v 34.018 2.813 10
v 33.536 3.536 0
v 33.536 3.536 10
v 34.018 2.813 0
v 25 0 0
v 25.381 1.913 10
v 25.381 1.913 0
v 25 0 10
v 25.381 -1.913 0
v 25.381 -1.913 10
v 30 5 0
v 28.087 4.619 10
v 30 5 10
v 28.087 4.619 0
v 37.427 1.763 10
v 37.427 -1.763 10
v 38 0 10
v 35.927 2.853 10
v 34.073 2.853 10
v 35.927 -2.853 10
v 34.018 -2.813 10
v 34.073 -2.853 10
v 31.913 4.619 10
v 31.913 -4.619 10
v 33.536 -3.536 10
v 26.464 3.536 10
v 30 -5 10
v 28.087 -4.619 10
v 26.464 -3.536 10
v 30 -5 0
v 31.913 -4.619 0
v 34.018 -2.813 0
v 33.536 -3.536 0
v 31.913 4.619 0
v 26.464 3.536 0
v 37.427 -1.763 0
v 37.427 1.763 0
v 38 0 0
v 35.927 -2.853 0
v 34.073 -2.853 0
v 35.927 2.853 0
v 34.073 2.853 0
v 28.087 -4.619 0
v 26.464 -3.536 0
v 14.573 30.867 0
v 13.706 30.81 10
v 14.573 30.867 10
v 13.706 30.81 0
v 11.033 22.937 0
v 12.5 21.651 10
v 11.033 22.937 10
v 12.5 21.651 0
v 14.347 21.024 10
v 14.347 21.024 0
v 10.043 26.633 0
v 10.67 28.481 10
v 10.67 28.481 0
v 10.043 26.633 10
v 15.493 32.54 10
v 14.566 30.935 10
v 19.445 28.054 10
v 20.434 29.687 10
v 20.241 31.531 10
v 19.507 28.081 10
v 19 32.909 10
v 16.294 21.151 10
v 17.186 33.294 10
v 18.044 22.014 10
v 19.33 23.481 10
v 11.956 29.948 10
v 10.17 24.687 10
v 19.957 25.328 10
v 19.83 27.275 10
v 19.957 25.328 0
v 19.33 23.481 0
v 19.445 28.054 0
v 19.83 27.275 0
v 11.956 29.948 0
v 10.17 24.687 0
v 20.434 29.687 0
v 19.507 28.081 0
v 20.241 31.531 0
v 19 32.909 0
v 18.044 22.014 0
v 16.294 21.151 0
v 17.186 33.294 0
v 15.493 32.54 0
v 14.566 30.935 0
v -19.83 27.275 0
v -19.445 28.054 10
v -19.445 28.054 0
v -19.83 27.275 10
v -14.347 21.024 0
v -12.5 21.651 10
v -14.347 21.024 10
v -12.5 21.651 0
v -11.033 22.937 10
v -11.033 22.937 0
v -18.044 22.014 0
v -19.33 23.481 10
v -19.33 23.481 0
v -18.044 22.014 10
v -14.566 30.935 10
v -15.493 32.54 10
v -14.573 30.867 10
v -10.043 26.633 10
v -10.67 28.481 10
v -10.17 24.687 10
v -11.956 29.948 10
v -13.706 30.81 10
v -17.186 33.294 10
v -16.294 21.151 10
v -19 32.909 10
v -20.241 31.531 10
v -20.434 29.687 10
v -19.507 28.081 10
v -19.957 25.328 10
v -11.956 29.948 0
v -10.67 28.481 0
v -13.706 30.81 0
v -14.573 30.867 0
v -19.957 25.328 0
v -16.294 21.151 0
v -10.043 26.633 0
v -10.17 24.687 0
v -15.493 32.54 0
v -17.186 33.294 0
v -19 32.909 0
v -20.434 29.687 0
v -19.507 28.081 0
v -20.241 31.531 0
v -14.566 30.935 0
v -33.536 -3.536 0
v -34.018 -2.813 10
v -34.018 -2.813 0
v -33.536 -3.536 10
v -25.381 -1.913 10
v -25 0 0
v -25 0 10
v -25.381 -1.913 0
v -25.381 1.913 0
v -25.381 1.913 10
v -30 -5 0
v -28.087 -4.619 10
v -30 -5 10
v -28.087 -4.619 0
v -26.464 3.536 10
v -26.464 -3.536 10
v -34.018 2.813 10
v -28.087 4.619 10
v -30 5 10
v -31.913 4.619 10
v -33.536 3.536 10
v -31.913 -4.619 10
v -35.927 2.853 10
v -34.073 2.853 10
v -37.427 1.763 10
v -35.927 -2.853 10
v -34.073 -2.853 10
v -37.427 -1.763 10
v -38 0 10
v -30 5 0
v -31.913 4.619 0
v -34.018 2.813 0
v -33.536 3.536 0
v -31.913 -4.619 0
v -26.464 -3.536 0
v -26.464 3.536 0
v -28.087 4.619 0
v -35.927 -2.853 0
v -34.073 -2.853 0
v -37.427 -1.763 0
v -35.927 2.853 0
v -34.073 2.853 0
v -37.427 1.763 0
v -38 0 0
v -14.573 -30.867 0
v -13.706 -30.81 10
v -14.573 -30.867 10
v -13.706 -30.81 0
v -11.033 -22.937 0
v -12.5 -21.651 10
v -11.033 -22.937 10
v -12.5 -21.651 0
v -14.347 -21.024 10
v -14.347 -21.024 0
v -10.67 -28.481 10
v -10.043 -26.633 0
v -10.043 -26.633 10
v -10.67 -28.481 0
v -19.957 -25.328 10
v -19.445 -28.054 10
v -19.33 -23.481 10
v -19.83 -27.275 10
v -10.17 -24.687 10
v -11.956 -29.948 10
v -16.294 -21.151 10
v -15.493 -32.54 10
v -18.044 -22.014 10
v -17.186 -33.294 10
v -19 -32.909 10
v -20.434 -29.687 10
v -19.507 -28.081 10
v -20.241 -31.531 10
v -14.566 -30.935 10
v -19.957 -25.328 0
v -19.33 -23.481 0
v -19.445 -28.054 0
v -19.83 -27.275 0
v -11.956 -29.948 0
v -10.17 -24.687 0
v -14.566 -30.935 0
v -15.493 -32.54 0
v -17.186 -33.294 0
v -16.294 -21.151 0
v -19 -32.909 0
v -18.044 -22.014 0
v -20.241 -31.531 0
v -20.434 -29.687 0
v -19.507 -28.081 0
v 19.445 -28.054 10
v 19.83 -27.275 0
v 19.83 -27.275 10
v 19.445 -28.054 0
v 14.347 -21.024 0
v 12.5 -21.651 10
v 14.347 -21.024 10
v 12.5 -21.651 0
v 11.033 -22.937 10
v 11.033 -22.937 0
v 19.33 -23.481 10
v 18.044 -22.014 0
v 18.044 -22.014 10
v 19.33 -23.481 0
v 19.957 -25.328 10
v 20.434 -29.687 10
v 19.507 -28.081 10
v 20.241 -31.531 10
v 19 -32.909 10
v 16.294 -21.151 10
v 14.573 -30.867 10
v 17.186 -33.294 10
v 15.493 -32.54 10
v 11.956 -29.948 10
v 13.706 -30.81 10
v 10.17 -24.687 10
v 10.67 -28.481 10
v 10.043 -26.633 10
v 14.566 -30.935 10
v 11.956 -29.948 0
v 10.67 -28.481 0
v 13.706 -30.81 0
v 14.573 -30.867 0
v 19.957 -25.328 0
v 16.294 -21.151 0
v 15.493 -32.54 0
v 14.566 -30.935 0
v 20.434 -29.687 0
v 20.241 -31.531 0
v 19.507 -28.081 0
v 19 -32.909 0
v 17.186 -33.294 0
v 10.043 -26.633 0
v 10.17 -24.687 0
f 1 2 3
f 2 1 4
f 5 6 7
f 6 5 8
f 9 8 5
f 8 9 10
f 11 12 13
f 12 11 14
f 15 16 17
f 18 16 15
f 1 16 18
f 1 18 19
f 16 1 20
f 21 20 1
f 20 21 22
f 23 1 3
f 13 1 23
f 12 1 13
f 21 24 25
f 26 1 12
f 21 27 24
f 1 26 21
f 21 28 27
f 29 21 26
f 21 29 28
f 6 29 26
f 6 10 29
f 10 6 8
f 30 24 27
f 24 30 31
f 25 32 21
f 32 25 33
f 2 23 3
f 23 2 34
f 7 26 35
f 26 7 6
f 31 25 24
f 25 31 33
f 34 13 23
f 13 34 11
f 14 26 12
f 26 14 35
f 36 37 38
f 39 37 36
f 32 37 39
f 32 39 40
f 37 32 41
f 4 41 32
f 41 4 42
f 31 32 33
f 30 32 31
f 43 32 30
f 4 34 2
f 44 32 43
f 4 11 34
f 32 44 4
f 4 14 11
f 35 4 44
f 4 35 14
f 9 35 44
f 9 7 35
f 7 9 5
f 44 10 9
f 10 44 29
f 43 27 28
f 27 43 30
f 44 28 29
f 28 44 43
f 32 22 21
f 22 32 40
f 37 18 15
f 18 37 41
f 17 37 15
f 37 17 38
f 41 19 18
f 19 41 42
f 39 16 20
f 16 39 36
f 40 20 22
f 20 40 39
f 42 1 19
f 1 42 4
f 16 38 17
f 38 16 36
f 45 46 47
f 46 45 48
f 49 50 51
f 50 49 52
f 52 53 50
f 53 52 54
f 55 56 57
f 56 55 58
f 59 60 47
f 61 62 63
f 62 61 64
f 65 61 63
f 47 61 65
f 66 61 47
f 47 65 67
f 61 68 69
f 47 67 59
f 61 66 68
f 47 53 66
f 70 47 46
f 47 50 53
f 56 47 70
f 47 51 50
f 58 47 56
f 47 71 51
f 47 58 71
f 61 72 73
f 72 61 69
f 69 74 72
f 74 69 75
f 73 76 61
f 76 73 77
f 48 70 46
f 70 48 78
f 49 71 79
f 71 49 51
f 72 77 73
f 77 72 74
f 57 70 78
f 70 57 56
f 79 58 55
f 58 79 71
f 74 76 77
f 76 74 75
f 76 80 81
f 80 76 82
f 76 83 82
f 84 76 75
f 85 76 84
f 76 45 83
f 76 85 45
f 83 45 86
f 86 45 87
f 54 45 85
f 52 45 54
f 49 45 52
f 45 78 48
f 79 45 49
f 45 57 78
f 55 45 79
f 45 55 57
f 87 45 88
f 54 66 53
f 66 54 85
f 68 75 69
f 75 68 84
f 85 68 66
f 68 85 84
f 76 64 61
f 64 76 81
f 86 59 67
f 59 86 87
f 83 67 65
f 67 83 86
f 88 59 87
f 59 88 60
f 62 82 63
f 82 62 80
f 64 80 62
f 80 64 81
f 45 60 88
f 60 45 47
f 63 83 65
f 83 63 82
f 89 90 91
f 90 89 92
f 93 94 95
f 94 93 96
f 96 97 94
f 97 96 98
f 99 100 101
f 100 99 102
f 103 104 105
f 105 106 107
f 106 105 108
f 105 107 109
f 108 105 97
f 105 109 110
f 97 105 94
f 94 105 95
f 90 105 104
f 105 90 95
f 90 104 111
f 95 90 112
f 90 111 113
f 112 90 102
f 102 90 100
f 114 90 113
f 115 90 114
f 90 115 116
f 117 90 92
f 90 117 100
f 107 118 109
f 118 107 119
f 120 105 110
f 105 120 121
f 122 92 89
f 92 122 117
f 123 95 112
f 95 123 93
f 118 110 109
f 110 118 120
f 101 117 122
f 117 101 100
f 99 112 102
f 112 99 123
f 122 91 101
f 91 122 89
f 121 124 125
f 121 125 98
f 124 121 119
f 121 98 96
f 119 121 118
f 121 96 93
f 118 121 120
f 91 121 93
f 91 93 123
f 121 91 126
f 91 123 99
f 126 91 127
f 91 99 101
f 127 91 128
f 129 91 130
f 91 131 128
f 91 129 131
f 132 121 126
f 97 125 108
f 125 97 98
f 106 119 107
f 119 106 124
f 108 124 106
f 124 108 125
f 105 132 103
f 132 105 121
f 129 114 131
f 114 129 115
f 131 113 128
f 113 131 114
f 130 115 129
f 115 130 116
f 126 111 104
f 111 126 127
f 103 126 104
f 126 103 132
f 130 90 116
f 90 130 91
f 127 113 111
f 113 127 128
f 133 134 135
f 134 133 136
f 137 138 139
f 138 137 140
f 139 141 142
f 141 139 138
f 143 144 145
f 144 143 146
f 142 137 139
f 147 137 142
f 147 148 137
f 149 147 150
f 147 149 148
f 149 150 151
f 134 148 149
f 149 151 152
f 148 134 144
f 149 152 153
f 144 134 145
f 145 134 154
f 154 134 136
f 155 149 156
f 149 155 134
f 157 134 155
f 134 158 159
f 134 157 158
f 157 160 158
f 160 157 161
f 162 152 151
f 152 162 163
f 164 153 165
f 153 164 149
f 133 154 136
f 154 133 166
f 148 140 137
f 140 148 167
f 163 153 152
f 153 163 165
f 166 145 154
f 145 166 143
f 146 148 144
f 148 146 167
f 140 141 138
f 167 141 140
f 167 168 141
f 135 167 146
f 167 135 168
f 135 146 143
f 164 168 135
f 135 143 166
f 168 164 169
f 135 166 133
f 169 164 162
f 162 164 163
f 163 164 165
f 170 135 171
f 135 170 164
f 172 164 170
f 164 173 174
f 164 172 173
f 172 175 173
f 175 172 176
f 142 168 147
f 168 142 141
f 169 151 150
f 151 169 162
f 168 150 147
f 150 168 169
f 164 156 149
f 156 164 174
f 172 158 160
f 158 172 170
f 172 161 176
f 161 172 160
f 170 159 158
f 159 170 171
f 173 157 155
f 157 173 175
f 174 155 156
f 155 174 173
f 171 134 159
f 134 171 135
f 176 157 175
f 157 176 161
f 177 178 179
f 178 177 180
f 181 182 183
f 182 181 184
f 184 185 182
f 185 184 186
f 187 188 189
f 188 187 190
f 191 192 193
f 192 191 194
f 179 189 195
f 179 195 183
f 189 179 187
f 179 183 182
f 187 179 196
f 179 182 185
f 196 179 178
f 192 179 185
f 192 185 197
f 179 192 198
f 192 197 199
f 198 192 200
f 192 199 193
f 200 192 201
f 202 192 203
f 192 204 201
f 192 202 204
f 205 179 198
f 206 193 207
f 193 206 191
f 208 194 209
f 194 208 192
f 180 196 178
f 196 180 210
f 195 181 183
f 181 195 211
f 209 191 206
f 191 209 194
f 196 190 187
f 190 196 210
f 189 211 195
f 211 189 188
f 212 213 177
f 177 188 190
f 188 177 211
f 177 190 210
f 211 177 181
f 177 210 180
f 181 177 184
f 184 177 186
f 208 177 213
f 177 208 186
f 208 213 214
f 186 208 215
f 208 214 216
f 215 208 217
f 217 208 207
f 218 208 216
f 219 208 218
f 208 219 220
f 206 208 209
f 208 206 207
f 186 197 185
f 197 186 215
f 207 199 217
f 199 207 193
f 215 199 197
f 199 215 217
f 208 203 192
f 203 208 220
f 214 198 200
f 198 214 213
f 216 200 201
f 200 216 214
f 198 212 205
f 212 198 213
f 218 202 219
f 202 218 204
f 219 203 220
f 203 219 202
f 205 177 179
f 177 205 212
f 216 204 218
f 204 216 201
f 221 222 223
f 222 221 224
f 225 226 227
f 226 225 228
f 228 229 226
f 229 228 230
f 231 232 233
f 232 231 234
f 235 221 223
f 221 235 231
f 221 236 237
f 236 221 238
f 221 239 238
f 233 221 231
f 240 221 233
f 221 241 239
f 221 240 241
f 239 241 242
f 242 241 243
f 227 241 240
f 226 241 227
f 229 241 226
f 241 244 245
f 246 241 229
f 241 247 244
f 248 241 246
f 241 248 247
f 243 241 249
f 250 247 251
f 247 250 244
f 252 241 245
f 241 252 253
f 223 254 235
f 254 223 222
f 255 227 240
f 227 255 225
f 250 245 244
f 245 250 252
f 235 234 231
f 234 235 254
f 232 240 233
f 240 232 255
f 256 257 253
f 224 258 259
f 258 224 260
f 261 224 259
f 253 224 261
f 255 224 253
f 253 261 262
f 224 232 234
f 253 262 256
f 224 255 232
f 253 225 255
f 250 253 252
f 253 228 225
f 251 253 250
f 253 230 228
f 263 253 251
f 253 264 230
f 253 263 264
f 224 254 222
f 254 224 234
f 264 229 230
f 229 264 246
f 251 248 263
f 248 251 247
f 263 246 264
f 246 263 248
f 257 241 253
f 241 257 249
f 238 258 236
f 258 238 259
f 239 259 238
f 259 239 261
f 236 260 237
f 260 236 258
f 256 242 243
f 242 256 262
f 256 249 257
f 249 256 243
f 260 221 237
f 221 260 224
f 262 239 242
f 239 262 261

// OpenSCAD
module test()
{
	union()
	{
		cylinder(h=10, d=10);
		translate([5, 0, 0])
			cylinder(h=10, d=6);
	}
}

module XPattern (n, dir, dist)
{
	dir = dir/sqrt(dir[0]*dir[0]+dir[1]*dir[1]+dir[2]*dir[2]);
	
	for (i=[0: n-1])
	{
		translate(dir*dist*i)
			children();
	}
}

module XYPattern (n1, dir1, dist1, n2, dir2, dist2)
{
	XPattern(n1, dir1, dist1)
		XPattern(n2, dir2, dist2)
			children();
}

module XYZPattern (n1, dir1, dist1, n2, dir2, dist2, n3, dir3, dist3)
{
	XYPattern(n1, dir1, dist1, n2, dir2, dist2)
		XPattern(n3, dir3, dist3)
			children();
}


module CircularPattern (n, radius, angle = 360, dir = 1, fixed=0)
{
	theta = angle/n;
	
	for (i = [0 : n-1])
	{
		rotate(a = theta*i*dir, v=[0, 0, 1])
			translate([radius, 0, 0])
				rotate(a = -theta*i*dir*fixed, v=[0, 0, 1])
					children();
	}
}

module CilindricalPattern (nRadial, distRadial, nAxial, distAxial, angle=360, dir=1, rotated=1)
{
	CircularPattern(nRadial, distRadial, angle, dir, rotated)
		XPattern(nAxial, [0, 0, 1], distAxial);
}
//XYZPattern (3, [1, 0, 0], 15, 2, [0, 1, 0], 15, 4, [0, 0, 1], 15)
	//test();
CircularPattern(6, 30)
	test();
echo("asdasdasd", false*45);
	
